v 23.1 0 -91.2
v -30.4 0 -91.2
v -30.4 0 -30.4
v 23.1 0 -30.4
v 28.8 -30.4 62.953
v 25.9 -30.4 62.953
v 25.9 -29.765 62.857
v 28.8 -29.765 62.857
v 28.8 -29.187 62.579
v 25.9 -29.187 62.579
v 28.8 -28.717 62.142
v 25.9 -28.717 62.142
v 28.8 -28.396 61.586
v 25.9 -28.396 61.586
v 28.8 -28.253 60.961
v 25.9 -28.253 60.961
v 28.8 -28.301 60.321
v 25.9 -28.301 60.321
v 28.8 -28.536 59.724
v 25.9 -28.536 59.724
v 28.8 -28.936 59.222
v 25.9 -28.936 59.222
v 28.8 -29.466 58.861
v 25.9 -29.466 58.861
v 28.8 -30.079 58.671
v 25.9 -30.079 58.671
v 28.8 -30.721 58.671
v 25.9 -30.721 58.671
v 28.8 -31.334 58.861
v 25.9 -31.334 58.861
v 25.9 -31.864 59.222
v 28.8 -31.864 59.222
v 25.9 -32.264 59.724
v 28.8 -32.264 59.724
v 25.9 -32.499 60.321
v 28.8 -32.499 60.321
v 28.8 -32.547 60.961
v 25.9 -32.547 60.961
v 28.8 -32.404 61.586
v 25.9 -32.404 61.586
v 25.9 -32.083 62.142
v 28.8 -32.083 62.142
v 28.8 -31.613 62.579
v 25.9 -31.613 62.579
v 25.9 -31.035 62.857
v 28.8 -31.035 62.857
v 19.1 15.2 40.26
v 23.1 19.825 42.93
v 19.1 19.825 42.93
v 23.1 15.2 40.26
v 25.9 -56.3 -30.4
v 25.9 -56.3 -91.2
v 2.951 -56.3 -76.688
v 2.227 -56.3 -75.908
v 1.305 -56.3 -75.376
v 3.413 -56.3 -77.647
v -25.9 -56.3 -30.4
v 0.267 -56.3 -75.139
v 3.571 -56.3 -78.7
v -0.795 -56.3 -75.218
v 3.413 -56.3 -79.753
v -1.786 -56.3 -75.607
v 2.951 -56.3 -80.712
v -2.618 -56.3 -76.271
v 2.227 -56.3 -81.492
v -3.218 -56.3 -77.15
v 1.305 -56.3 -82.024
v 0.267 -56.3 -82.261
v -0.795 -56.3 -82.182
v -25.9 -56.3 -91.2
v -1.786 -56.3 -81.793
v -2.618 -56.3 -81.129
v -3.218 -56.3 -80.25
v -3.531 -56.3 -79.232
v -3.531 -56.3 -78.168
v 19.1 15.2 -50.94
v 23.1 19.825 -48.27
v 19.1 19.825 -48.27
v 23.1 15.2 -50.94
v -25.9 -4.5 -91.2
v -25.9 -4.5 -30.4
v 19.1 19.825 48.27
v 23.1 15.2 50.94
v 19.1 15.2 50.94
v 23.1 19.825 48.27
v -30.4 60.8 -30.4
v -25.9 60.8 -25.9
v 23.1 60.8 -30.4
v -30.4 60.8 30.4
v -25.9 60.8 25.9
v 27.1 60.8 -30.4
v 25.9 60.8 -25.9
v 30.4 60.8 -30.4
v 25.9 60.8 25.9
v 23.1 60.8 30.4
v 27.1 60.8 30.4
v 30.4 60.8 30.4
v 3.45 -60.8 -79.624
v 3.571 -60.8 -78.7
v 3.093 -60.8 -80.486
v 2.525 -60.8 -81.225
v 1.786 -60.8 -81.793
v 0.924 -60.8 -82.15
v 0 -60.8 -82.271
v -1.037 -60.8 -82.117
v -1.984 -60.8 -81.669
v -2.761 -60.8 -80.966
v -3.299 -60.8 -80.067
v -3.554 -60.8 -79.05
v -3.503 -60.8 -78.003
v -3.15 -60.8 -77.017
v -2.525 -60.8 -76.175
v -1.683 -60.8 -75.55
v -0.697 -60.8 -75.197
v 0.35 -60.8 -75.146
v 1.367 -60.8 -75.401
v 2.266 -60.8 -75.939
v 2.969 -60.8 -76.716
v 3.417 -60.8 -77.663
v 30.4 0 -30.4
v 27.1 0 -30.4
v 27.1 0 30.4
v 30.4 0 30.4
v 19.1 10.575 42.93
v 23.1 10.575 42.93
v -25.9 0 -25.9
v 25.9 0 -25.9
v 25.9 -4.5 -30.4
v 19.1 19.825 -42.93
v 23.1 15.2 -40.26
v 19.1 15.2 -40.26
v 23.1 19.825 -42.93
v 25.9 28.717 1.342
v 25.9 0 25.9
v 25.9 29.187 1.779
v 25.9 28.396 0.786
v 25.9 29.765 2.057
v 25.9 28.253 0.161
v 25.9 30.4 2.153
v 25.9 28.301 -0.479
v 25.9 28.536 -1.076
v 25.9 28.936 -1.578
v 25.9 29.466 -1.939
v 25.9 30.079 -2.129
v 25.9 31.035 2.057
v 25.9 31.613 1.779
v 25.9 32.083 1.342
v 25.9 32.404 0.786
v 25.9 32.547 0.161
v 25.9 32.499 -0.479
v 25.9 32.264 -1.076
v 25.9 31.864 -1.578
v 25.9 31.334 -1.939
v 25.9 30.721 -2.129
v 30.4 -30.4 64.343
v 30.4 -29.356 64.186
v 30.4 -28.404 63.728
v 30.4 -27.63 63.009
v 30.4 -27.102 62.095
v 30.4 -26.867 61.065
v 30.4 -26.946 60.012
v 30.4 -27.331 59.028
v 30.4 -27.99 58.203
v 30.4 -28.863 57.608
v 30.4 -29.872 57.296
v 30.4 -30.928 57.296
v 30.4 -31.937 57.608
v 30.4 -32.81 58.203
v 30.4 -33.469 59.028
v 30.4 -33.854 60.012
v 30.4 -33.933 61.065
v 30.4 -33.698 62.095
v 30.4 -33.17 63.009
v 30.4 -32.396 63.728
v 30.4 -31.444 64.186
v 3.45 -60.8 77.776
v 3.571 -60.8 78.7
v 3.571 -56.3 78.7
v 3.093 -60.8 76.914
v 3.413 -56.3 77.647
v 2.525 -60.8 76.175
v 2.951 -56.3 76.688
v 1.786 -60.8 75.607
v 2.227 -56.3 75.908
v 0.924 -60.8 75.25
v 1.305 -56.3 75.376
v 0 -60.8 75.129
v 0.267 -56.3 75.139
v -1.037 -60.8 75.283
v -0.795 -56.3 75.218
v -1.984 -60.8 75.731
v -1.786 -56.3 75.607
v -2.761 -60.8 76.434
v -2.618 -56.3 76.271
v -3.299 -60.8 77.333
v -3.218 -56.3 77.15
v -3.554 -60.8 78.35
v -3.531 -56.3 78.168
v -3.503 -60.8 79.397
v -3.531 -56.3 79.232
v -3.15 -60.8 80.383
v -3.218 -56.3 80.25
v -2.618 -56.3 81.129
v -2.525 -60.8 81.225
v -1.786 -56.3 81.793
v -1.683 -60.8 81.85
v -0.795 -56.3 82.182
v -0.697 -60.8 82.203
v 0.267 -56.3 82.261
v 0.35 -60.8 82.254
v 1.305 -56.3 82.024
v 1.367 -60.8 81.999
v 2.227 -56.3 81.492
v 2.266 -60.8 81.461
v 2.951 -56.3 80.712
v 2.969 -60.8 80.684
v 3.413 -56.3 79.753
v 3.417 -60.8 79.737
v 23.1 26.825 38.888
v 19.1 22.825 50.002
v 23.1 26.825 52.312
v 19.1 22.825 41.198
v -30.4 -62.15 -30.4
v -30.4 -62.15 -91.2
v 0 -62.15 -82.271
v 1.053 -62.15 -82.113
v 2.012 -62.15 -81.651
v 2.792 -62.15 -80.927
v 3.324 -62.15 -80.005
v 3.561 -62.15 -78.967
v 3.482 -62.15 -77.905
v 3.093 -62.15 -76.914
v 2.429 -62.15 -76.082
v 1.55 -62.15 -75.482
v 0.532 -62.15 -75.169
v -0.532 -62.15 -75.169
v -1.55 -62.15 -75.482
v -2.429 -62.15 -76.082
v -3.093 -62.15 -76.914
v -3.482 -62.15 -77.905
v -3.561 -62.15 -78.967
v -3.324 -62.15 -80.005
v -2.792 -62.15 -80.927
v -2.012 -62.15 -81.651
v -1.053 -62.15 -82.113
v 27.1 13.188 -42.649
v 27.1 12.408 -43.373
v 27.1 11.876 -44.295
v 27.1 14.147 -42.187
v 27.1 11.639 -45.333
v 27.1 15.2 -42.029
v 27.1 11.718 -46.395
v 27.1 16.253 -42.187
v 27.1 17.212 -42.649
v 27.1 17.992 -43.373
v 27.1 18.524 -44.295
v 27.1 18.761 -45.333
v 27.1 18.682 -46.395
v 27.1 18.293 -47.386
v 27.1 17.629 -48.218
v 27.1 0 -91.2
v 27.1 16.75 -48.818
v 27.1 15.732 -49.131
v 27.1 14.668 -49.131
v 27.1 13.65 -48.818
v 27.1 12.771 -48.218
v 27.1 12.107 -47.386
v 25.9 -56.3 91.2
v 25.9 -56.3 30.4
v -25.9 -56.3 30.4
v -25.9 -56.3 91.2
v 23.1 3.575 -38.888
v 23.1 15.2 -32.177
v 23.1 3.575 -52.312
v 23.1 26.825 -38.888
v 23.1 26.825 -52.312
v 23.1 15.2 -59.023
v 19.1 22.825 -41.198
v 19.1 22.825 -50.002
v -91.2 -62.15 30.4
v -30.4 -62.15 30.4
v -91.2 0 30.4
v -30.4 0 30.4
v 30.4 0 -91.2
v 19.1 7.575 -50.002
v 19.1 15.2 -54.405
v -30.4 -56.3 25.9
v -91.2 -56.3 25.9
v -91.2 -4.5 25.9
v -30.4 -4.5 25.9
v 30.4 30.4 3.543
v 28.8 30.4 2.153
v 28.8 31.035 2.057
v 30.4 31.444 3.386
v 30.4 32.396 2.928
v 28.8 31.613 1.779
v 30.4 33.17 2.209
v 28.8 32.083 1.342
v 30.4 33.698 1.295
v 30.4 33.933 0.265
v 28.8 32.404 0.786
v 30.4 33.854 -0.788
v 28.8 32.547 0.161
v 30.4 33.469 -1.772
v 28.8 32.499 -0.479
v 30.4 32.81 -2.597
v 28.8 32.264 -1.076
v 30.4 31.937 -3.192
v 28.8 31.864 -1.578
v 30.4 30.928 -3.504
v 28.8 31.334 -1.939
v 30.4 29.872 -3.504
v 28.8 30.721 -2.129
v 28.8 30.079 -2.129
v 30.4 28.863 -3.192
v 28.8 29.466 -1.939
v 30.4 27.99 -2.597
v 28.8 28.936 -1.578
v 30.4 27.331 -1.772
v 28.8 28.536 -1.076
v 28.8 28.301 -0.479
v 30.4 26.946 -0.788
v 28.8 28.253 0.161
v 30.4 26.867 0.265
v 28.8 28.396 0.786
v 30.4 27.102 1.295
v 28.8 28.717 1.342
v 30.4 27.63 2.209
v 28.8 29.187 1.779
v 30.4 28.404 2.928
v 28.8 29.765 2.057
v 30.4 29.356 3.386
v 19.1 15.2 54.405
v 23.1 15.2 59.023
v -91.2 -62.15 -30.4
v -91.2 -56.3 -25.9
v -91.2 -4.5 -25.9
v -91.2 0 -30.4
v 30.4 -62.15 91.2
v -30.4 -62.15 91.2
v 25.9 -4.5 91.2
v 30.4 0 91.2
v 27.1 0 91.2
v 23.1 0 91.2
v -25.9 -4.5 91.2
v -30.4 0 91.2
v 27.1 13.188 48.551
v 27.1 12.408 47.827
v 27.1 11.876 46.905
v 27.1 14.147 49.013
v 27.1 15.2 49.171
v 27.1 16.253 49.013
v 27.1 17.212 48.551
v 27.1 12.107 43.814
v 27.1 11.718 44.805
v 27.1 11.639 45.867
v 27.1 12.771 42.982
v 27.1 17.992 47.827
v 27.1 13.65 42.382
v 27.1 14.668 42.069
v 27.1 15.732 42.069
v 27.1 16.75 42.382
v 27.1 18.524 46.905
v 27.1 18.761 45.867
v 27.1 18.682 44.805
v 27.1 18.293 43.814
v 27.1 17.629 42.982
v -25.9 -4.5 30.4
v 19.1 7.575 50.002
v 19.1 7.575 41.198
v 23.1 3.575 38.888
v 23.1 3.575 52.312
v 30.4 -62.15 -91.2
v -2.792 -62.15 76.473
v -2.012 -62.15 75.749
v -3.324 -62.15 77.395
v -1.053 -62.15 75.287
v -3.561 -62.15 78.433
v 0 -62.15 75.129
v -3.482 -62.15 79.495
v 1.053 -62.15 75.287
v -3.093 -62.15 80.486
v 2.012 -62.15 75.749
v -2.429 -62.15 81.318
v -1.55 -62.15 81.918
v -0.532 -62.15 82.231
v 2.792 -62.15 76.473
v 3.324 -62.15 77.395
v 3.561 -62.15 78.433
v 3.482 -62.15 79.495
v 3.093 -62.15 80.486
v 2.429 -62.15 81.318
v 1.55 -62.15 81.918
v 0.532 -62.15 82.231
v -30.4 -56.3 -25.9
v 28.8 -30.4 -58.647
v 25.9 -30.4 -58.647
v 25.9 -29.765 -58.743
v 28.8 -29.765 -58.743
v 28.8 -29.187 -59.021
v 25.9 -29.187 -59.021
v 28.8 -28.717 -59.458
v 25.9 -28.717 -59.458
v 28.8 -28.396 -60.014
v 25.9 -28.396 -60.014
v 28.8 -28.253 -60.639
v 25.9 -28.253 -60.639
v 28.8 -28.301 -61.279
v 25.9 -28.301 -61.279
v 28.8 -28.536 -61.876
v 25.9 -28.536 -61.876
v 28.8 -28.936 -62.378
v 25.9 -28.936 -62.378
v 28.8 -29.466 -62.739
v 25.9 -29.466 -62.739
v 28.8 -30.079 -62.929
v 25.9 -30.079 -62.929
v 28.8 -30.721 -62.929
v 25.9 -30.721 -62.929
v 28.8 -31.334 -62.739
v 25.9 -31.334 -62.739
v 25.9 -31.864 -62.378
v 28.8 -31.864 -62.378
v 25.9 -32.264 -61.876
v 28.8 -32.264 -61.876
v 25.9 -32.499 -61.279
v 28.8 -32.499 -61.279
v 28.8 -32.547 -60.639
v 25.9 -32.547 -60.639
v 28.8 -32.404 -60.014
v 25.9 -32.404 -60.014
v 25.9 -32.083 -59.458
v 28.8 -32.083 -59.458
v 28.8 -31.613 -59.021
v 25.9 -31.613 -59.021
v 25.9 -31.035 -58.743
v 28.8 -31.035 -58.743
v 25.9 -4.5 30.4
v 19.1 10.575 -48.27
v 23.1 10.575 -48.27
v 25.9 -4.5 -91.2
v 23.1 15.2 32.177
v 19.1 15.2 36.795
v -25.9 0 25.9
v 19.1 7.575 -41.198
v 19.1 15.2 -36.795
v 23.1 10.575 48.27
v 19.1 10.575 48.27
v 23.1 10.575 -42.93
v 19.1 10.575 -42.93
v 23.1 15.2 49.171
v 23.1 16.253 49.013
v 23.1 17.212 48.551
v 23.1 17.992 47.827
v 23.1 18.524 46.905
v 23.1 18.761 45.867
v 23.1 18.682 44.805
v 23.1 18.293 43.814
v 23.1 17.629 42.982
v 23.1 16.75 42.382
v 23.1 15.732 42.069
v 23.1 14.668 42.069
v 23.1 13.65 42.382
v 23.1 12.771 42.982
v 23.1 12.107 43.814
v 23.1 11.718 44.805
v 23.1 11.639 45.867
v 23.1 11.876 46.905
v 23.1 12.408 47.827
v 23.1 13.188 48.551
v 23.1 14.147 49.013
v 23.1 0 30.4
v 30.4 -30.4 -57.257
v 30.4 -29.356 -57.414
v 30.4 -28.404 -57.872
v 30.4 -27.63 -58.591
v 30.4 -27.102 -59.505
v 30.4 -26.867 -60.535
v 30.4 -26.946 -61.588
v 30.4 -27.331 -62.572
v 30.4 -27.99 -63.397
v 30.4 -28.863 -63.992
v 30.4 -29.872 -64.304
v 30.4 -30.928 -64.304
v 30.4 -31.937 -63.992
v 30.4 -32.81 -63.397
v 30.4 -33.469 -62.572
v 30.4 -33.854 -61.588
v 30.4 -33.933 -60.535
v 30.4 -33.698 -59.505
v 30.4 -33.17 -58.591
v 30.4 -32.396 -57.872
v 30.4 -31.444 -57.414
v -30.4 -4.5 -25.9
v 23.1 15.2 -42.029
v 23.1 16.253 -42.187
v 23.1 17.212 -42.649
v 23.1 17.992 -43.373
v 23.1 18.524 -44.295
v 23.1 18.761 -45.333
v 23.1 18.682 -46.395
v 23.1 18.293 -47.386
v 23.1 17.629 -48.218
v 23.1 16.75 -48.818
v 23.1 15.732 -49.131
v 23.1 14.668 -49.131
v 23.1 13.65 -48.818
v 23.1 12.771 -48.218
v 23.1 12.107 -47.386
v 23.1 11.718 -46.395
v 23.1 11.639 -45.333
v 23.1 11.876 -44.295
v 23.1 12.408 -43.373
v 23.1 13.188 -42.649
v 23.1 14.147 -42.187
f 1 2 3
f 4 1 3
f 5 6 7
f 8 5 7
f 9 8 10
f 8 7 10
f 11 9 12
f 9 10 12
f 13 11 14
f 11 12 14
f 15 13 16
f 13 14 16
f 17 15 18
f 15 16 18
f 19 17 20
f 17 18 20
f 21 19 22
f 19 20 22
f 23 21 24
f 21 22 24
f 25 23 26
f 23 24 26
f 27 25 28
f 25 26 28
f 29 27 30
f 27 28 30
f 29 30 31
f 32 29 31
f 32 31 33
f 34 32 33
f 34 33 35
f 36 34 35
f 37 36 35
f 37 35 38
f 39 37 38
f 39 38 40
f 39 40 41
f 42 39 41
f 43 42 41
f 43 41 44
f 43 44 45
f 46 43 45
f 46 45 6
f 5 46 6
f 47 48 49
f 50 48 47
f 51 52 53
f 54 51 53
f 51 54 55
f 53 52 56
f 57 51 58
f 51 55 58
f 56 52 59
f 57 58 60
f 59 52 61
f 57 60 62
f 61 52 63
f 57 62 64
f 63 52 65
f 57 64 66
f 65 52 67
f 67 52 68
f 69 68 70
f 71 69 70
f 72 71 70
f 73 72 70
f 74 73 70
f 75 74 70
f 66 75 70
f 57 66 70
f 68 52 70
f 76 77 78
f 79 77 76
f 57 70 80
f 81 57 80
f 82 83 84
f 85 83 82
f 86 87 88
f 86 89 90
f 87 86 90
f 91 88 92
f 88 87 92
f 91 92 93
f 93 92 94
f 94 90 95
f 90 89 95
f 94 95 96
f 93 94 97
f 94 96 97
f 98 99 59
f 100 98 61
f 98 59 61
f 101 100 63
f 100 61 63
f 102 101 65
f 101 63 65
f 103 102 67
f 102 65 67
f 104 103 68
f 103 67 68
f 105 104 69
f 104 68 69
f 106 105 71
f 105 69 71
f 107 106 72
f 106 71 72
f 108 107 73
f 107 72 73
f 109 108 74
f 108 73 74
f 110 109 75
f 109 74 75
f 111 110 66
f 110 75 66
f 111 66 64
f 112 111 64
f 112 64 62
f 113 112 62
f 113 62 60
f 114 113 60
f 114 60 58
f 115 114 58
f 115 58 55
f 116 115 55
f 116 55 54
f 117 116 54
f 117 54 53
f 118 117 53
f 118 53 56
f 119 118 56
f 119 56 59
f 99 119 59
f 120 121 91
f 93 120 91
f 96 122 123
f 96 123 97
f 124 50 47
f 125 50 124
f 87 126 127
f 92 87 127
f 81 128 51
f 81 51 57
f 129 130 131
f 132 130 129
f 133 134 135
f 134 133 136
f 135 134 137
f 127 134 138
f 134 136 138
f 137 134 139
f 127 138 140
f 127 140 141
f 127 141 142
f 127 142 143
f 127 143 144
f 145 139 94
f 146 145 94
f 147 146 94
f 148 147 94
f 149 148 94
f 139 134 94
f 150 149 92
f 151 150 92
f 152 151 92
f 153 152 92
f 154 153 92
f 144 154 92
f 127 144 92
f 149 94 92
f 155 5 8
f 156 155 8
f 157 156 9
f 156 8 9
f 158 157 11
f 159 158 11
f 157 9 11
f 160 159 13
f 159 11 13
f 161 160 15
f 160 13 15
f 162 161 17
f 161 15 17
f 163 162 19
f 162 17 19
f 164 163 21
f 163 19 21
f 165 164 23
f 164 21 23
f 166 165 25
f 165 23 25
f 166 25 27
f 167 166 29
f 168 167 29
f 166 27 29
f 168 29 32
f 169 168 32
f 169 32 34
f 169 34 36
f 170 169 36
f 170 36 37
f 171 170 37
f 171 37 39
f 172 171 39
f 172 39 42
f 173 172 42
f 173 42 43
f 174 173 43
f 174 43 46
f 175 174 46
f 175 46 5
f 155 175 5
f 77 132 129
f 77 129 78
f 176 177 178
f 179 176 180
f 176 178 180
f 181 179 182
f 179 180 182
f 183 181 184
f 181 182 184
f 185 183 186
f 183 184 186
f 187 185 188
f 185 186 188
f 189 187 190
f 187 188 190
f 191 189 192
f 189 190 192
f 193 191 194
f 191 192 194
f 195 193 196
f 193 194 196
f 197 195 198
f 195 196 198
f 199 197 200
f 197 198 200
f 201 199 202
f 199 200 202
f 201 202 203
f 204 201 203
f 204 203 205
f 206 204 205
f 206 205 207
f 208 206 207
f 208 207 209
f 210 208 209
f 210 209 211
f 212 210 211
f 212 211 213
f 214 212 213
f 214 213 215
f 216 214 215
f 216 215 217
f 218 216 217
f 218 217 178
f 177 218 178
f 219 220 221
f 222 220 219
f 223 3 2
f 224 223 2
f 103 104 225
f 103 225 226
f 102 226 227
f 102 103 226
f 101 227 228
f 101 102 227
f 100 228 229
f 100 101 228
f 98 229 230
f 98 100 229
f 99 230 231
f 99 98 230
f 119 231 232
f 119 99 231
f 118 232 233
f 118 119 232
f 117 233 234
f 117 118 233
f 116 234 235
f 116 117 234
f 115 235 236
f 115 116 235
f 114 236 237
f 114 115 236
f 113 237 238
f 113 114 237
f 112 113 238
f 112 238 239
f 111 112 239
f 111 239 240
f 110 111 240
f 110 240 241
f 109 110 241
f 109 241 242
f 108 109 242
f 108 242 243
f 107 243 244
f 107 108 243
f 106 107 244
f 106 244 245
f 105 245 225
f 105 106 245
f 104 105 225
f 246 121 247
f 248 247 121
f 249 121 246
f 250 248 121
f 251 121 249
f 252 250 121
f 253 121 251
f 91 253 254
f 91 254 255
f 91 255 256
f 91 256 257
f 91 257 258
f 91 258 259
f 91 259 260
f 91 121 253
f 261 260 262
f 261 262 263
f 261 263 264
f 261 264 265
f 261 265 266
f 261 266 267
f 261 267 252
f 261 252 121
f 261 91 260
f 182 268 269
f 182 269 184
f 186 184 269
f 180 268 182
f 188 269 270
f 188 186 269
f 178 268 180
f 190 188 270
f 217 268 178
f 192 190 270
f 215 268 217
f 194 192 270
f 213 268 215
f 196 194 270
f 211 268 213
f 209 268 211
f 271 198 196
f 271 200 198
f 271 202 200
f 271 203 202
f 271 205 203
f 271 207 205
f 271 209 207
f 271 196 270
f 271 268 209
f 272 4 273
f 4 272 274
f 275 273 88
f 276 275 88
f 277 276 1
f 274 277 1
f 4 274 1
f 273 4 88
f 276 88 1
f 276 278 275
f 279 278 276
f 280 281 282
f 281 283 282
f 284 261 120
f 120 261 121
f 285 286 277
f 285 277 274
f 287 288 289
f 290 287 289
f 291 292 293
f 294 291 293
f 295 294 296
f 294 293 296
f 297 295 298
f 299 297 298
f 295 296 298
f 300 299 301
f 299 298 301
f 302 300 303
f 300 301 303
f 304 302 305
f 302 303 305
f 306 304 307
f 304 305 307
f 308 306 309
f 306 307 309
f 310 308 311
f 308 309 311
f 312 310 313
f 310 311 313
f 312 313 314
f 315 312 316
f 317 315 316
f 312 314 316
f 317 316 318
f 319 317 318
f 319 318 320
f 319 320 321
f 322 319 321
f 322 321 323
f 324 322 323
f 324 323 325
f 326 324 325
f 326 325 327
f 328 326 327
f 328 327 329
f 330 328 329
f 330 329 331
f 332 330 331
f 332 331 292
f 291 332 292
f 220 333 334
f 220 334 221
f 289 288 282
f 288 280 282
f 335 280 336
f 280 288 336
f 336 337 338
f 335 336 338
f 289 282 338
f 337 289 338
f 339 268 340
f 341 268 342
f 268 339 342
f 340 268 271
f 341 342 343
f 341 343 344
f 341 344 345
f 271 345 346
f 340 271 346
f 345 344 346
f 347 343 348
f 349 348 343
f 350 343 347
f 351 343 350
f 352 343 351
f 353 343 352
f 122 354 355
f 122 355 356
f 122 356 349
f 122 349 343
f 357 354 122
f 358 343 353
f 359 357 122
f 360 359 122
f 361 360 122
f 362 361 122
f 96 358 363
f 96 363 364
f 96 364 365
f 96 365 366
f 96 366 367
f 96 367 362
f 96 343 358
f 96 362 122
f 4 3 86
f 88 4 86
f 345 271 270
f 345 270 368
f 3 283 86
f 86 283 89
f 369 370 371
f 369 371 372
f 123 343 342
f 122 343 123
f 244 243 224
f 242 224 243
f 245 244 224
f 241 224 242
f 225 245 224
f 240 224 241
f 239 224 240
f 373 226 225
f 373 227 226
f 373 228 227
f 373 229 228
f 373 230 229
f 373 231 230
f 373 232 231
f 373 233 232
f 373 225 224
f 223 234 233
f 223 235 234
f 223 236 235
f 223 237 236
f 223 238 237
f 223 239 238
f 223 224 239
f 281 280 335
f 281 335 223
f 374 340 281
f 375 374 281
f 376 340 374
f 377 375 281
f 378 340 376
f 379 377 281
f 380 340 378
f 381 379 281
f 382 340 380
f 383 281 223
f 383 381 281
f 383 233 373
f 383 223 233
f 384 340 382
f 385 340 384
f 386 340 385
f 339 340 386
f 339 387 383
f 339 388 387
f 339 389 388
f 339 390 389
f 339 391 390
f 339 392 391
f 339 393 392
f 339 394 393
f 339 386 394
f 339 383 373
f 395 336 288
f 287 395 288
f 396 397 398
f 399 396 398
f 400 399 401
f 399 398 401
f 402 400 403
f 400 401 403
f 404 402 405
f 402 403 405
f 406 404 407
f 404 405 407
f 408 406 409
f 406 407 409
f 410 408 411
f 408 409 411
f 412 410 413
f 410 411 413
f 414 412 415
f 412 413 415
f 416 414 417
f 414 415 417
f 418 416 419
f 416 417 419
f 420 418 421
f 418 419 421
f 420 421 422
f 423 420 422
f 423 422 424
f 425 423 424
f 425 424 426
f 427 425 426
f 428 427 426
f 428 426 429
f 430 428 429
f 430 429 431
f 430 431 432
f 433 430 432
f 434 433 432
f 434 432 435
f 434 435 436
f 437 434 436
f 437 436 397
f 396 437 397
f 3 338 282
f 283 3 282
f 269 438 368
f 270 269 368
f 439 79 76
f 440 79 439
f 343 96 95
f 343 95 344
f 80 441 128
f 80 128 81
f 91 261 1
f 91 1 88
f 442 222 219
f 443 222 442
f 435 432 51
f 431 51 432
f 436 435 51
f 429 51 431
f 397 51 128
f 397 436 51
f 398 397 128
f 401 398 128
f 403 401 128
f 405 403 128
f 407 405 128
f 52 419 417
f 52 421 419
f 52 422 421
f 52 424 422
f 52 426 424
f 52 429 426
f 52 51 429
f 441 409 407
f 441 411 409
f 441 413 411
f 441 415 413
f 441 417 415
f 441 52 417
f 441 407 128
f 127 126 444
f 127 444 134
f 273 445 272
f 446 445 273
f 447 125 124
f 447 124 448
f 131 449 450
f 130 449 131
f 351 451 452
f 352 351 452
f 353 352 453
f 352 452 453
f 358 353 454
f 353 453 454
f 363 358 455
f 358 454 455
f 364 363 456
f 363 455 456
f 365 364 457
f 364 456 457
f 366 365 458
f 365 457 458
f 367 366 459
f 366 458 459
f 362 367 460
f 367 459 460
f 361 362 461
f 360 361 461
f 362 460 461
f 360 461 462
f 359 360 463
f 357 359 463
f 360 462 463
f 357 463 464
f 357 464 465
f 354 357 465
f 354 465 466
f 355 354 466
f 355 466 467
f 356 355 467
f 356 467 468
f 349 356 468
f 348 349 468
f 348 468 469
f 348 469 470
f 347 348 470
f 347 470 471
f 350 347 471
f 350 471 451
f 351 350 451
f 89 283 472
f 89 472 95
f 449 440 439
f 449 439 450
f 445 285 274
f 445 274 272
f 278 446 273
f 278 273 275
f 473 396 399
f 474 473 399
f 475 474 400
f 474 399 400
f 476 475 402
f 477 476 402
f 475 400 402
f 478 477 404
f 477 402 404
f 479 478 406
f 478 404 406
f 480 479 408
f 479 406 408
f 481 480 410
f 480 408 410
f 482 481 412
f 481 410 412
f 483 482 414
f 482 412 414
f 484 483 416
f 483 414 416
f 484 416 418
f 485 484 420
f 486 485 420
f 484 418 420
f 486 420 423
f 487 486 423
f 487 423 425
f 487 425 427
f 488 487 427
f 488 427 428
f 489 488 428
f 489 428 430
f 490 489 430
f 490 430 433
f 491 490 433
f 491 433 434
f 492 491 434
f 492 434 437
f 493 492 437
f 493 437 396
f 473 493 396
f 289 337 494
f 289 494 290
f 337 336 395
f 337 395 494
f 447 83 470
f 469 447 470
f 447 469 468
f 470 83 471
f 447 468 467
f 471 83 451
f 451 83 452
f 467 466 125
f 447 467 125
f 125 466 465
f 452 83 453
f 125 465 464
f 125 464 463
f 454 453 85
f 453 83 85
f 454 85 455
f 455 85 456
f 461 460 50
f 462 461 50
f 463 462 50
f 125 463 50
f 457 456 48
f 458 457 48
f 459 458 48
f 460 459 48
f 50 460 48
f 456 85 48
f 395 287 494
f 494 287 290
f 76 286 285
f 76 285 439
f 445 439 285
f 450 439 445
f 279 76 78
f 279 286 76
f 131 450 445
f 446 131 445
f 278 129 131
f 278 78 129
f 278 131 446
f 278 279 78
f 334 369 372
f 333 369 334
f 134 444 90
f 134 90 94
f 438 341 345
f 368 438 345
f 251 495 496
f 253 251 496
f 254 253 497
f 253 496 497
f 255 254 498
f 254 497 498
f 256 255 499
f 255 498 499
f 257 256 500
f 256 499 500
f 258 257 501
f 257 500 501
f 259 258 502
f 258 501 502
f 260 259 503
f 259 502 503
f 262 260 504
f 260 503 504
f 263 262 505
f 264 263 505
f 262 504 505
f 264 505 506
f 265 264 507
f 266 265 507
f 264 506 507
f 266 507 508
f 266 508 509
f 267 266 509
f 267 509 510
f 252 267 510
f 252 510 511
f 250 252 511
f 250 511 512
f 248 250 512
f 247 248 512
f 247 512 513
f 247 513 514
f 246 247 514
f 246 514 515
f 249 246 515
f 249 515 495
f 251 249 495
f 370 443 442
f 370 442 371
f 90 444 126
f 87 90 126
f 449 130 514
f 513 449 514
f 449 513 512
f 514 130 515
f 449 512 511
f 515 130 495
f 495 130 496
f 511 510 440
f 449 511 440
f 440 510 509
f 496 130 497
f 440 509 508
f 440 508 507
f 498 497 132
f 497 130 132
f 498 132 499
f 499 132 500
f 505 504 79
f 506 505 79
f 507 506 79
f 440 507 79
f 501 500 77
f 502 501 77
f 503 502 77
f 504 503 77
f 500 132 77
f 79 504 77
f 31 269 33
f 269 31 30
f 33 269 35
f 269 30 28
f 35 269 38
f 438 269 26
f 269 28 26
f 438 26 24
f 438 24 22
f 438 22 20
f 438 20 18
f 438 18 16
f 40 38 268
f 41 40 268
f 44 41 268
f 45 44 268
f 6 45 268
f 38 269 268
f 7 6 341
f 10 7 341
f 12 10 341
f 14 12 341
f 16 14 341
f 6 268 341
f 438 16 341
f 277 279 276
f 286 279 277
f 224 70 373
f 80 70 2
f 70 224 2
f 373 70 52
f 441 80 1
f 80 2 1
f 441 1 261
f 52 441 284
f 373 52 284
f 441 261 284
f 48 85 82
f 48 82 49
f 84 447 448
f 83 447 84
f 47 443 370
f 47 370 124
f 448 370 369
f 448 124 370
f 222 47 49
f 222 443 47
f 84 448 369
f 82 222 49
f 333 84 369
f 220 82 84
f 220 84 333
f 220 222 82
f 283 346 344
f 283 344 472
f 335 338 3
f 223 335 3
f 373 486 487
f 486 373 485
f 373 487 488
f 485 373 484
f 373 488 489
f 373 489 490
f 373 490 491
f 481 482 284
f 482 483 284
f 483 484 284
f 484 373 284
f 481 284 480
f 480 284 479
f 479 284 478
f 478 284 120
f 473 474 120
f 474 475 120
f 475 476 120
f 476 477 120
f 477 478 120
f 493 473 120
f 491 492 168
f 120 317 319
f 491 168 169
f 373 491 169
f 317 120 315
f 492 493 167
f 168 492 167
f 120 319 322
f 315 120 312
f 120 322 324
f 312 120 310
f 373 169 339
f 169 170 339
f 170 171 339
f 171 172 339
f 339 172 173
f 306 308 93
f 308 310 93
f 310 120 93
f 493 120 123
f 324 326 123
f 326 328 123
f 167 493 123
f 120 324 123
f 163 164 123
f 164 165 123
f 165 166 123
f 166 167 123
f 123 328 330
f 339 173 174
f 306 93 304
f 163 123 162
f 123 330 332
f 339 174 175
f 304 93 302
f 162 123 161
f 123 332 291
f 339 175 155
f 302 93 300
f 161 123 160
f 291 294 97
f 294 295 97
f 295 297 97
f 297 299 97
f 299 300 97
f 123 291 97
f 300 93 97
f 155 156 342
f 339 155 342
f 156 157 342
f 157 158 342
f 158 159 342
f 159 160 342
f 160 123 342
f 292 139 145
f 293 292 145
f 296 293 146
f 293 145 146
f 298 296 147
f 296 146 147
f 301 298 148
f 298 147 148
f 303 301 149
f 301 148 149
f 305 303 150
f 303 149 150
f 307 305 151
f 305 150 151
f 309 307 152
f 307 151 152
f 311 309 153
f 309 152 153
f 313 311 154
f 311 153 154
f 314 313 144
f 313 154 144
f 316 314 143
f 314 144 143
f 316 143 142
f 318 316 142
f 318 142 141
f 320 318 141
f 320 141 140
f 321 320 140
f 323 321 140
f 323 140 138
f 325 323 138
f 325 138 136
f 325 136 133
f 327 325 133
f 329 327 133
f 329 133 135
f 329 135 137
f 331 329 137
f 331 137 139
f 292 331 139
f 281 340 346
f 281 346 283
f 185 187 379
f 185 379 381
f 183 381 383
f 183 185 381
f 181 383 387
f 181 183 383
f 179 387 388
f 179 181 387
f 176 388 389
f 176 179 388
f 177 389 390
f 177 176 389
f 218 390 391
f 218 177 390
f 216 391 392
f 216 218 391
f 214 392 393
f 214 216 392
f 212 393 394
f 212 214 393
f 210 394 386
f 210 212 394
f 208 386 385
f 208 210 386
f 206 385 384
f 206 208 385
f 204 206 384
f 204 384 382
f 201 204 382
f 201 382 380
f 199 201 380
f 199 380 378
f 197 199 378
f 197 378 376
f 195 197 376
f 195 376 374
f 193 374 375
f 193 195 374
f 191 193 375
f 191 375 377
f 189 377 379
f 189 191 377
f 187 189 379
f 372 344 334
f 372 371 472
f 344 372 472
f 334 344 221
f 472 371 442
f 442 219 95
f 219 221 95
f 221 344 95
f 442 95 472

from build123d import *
from build123d.topology import SkipClean

# Parameters (mm, degrees)
ESQUISSE1_W                                       = 60.8
ESQUISSE1_H                                       = 121.6
BOSS_EXTRU_1_DEPTH                                = 91.2
ESQUISSE2_W                                       = 60.8
ESQUISSE2_H                                       = 60.8
ENL_V_MAT_EXTRU_1_DEPTH                           = 126.342411019
ESQUISSE3_W                                       = 51.8
ESQUISSE3_H                                       = 51.8
ENL_V_MAT_EXTRU_2_DEPTH                           = 60.8
BOSS_EXTRU_3_DEPTH                                = 4
ESQUISSE6_W                                       = 51.8
ESQUISSE6_H                                       = 51.8
ENL_V_MAT_EXTRU_3_DEPTH                           = 60.8
D_GAGEMENT_1_43_D                                 = 7.14248
FRAISAGE_POUR_VIS_T_TE_FRAIS_E_BOMB_E_D           = 4.3053
FRAISAGE_POUR_VIS_T_TE_FRAIS_E_BOMB_E_DEPTH       = 4.5
FRAISAGE_POUR_VIS_T_TE_FRAIS_E_BOMB_E_CSINK_D     = 7.0866
FRAISAGE_POUR_VIS_T_TE_FRAIS_E_BOMB_E_CSINK_ANGLE = 82
D_GAGEMENT_1_42_D                                 = 7.14248
D_GAGEMENT_1_42_DEPTH                             = 20
BOSS_EXTRU_5_DEPTH                                = 4
CHANFREIN1_SIZE                                   = 4
ESQUISSE26_W                                      = 60.8
ESQUISSE26_H                                      = 60.8
ESQUISSE26_W_2                                    = 51.800000032
ESQUISSE26_H_2                                    = 51.800000032
BOSS_EXTRU_8_DEPTH                                = 60.800000066
ESQUISSE27_R                                      = 3.57124
BOSS_EXTRU_9_DEPTH                                = 1.35


with BuildPart() as part:
    # Esquisse1 → Boss.-Extru.1 (new, symmetric)
    with BuildSketch(Plane.XY):
        Rectangle(ESQUISSE1_W, ESQUISSE1_H)
    extrude(amount=BOSS_EXTRU_1_DEPTH, both=True)

    # Esquisse2 → Enlèv. mat.-Extru.1 (cut, through all)
    with BuildSketch(Plane.ZY.offset(30.4)):
        with Locations((-60.8, 30.4)):
            Rectangle(ESQUISSE2_W, ESQUISSE2_H)
    enl_v_mat_extru_1 = extrude(amount=-ENL_V_MAT_EXTRU_1_DEPTH, mode=Mode.SUBTRACT)

    # Esquisse3 → Enlèv. mat.-Extru.2 (cut)
    with BuildSketch(Plane(origin=(0, 0, -91.2), x_dir=(-1, 0, 0), z_dir=(0, 0, -1))):
        with Locations((0, -30.4)):
            Rectangle(ESQUISSE3_W, ESQUISSE3_H)
    enl_v_mat_extru_2 = extrude(amount=-ENL_V_MAT_EXTRU_2_DEPTH, mode=Mode.SUBTRACT)

    # Symétrie2: Enlèv. mat.-Extru.1, Enlèv. mat.-Extru.2 across plane
    add(enl_v_mat_extru_1.mirror(Plane.XY), mode=Mode.SUBTRACT)
    add(enl_v_mat_extru_2.mirror(Plane.XY), mode=Mode.SUBTRACT)

    # Esquisse10 → Boss.-Extru.3 (add)
    with BuildSketch(Plane(origin=(27.1, 0, 0), x_dir=(0, 0, -1), z_dir=(1, 0, 0))):
        Polygon((30.4, 60.8), (30.4, 0), (91.2, 0), align=None)
        Polygon((-30.4, 60.8), (-91.2, 0), (-30.4, 0), align=None)
    extrude(amount=-BOSS_EXTRU_3_DEPTH)

    # Esquisse6 → Enlèv. mat.-Extru.3 (cut)
    with BuildSketch(Plane(origin=(0, 60.8, 0), x_dir=(1, 0, 0), z_dir=(0, 1, 0))):
        Rectangle(ESQUISSE6_W, ESQUISSE6_H)
    extrude(amount=-ENL_V_MAT_EXTRU_3_DEPTH, mode=Mode.SUBTRACT)

    # Dégagement 1/43 (through all)
    with Locations(Plane(origin=(27.1, 0, 0), x_dir=(0, 0, -1), z_dir=(1, 0, 0))):
        with Locations((45.6, 15.2), (-45.6, 15.2)):
            Hole(D_GAGEMENT_1_43_D / 2)

    # Fraisage pour vis _ t_te frais_e bomb_e
    with Locations(Plane(origin=(30.4, 0, 0), x_dir=(0, 0, -1), z_dir=(1, 0, 0))):
        with Locations((-60.8, -30.4), (0, 30.4), (60.8, -30.4)):
            CounterSinkHole(FRAISAGE_POUR_VIS_T_TE_FRAIS_E_BOMB_E_D / 2, FRAISAGE_POUR_VIS_T_TE_FRAIS_E_BOMB_E_CSINK_D / 2, depth=FRAISAGE_POUR_VIS_T_TE_FRAIS_E_BOMB_E_DEPTH, counter_sink_angle=FRAISAGE_POUR_VIS_T_TE_FRAIS_E_BOMB_E_CSINK_ANGLE)

    # Dégagement 1/42
    with Locations(Plane(origin=(0, -60.8, 0), x_dir=(-1, 0, 0), z_dir=(0, -1, 0))):
        with Locations((0, 78.7), (0, -78.7)):
            Hole(D_GAGEMENT_1_42_D / 2, depth=D_GAGEMENT_1_42_DEPTH)

    # Esquisse23 → Boss.-Extru.5 (add)
    # profile 1 of 2: a face of its own
    with BuildSketch(Plane.ZY.offset(-23.1)):
        Polygon((-41.197704197, 22.825), (-50.002295803, 22.825), (-54.404591605, 15.2), (-50.002295803, 7.575), (-41.197704197, 7.575), (-36.795408395, 15.2), align=None)
        Polygon((-40.25951001, 15.2), (-42.929755005, 19.825), (-48.270244995, 19.825), (-50.94048999, 15.2), (-48.270244995, 10.575), (-42.929755005, 10.575), align=None, mode=Mode.SUBTRACT)
    # profile 2 of 2: a face of its own
    with BuildSketch(Plane.ZY.offset(-23.1)):
        Polygon((54.404591605, 15.2), (50.002295803, 22.825), (41.197704197, 22.825), (36.795408395, 15.2), (41.197704197, 7.575), (50.002295803, 7.575), align=None)
        Polygon((50.94048999, 15.2), (48.270244995, 19.825), (42.929755005, 19.825), (40.25951001, 15.2), (42.929755005, 10.575), (48.270244995, 10.575), align=None, mode=Mode.SUBTRACT)
    extrude(amount=BOSS_EXTRU_5_DEPTH)

    # Chanfrein1
    chanfrein1_edges = [part.edges().sort_by_distance(p)[0] for p in [
        (23.1, 19.0125, 38.996556296),
        (23.1, 11.3875, 38.996556296),
        (23.1, 7.575, 45.6),
        (23.1, 11.3875, 52.203443704),
        (23.1, 19.0125, 52.203443704),
        (23.1, 22.825, 45.6),
        (23.1, 11.3875, -38.996556296),
        (23.1, 19.0125, -38.996556296),
        (23.1, 7.575, -45.6),
        (23.1, 11.3875, -52.203443704),
        (23.1, 22.825, -45.6),
        (23.1, 19.0125, -52.203443704),
    ]]
    chamfer(chanfrein1_edges, length=CHANFREIN1_SIZE - 0.0001)  # a hair under: the kernel refuses the full size

    # Esquisse26 → Boss.-Extru.8 (add)
    with BuildSketch(Plane.ZY.offset(30.4)):
        with Locations((0, -30.4)):
            Rectangle(ESQUISSE26_W, ESQUISSE26_H)
        with Locations((0, -30.4)):
            Rectangle(ESQUISSE26_W_2, ESQUISSE26_H_2, mode=Mode.SUBTRACT)
    extrude(amount=BOSS_EXTRU_8_DEPTH)

    # Esquisse27 → Boss.-Extru.9 (add)
    with SkipClean():  # the faces are left unmerged after this step: merging them gives an invalid solid
        with BuildSketch(Plane.XZ.offset(60.8)):
            Polygon((-30.4, -91.2), (30.4, -91.2), (30.4, 91.2), (-30.4, 91.2), (-30.4, 30.4), (-91.200000066, 30.4), (-91.200000066, -30.4), (-30.4, -30.4), align=None)
            with Locations(Location((0, 78.7, 0), (0, 0, 270))):
                Circle(ESQUISSE27_R, mode=Mode.SUBTRACT)
            with Locations(Location((0, -78.7, 0), (0, 0, 270))):
                Circle(ESQUISSE27_R, mode=Mode.SUBTRACT)
        extrude(amount=BOSS_EXTRU_9_DEPTH)
    add(part.part.scale(1), mode=Mode.REPLACE)  # the faces are merged on a copy


solid = part.part
